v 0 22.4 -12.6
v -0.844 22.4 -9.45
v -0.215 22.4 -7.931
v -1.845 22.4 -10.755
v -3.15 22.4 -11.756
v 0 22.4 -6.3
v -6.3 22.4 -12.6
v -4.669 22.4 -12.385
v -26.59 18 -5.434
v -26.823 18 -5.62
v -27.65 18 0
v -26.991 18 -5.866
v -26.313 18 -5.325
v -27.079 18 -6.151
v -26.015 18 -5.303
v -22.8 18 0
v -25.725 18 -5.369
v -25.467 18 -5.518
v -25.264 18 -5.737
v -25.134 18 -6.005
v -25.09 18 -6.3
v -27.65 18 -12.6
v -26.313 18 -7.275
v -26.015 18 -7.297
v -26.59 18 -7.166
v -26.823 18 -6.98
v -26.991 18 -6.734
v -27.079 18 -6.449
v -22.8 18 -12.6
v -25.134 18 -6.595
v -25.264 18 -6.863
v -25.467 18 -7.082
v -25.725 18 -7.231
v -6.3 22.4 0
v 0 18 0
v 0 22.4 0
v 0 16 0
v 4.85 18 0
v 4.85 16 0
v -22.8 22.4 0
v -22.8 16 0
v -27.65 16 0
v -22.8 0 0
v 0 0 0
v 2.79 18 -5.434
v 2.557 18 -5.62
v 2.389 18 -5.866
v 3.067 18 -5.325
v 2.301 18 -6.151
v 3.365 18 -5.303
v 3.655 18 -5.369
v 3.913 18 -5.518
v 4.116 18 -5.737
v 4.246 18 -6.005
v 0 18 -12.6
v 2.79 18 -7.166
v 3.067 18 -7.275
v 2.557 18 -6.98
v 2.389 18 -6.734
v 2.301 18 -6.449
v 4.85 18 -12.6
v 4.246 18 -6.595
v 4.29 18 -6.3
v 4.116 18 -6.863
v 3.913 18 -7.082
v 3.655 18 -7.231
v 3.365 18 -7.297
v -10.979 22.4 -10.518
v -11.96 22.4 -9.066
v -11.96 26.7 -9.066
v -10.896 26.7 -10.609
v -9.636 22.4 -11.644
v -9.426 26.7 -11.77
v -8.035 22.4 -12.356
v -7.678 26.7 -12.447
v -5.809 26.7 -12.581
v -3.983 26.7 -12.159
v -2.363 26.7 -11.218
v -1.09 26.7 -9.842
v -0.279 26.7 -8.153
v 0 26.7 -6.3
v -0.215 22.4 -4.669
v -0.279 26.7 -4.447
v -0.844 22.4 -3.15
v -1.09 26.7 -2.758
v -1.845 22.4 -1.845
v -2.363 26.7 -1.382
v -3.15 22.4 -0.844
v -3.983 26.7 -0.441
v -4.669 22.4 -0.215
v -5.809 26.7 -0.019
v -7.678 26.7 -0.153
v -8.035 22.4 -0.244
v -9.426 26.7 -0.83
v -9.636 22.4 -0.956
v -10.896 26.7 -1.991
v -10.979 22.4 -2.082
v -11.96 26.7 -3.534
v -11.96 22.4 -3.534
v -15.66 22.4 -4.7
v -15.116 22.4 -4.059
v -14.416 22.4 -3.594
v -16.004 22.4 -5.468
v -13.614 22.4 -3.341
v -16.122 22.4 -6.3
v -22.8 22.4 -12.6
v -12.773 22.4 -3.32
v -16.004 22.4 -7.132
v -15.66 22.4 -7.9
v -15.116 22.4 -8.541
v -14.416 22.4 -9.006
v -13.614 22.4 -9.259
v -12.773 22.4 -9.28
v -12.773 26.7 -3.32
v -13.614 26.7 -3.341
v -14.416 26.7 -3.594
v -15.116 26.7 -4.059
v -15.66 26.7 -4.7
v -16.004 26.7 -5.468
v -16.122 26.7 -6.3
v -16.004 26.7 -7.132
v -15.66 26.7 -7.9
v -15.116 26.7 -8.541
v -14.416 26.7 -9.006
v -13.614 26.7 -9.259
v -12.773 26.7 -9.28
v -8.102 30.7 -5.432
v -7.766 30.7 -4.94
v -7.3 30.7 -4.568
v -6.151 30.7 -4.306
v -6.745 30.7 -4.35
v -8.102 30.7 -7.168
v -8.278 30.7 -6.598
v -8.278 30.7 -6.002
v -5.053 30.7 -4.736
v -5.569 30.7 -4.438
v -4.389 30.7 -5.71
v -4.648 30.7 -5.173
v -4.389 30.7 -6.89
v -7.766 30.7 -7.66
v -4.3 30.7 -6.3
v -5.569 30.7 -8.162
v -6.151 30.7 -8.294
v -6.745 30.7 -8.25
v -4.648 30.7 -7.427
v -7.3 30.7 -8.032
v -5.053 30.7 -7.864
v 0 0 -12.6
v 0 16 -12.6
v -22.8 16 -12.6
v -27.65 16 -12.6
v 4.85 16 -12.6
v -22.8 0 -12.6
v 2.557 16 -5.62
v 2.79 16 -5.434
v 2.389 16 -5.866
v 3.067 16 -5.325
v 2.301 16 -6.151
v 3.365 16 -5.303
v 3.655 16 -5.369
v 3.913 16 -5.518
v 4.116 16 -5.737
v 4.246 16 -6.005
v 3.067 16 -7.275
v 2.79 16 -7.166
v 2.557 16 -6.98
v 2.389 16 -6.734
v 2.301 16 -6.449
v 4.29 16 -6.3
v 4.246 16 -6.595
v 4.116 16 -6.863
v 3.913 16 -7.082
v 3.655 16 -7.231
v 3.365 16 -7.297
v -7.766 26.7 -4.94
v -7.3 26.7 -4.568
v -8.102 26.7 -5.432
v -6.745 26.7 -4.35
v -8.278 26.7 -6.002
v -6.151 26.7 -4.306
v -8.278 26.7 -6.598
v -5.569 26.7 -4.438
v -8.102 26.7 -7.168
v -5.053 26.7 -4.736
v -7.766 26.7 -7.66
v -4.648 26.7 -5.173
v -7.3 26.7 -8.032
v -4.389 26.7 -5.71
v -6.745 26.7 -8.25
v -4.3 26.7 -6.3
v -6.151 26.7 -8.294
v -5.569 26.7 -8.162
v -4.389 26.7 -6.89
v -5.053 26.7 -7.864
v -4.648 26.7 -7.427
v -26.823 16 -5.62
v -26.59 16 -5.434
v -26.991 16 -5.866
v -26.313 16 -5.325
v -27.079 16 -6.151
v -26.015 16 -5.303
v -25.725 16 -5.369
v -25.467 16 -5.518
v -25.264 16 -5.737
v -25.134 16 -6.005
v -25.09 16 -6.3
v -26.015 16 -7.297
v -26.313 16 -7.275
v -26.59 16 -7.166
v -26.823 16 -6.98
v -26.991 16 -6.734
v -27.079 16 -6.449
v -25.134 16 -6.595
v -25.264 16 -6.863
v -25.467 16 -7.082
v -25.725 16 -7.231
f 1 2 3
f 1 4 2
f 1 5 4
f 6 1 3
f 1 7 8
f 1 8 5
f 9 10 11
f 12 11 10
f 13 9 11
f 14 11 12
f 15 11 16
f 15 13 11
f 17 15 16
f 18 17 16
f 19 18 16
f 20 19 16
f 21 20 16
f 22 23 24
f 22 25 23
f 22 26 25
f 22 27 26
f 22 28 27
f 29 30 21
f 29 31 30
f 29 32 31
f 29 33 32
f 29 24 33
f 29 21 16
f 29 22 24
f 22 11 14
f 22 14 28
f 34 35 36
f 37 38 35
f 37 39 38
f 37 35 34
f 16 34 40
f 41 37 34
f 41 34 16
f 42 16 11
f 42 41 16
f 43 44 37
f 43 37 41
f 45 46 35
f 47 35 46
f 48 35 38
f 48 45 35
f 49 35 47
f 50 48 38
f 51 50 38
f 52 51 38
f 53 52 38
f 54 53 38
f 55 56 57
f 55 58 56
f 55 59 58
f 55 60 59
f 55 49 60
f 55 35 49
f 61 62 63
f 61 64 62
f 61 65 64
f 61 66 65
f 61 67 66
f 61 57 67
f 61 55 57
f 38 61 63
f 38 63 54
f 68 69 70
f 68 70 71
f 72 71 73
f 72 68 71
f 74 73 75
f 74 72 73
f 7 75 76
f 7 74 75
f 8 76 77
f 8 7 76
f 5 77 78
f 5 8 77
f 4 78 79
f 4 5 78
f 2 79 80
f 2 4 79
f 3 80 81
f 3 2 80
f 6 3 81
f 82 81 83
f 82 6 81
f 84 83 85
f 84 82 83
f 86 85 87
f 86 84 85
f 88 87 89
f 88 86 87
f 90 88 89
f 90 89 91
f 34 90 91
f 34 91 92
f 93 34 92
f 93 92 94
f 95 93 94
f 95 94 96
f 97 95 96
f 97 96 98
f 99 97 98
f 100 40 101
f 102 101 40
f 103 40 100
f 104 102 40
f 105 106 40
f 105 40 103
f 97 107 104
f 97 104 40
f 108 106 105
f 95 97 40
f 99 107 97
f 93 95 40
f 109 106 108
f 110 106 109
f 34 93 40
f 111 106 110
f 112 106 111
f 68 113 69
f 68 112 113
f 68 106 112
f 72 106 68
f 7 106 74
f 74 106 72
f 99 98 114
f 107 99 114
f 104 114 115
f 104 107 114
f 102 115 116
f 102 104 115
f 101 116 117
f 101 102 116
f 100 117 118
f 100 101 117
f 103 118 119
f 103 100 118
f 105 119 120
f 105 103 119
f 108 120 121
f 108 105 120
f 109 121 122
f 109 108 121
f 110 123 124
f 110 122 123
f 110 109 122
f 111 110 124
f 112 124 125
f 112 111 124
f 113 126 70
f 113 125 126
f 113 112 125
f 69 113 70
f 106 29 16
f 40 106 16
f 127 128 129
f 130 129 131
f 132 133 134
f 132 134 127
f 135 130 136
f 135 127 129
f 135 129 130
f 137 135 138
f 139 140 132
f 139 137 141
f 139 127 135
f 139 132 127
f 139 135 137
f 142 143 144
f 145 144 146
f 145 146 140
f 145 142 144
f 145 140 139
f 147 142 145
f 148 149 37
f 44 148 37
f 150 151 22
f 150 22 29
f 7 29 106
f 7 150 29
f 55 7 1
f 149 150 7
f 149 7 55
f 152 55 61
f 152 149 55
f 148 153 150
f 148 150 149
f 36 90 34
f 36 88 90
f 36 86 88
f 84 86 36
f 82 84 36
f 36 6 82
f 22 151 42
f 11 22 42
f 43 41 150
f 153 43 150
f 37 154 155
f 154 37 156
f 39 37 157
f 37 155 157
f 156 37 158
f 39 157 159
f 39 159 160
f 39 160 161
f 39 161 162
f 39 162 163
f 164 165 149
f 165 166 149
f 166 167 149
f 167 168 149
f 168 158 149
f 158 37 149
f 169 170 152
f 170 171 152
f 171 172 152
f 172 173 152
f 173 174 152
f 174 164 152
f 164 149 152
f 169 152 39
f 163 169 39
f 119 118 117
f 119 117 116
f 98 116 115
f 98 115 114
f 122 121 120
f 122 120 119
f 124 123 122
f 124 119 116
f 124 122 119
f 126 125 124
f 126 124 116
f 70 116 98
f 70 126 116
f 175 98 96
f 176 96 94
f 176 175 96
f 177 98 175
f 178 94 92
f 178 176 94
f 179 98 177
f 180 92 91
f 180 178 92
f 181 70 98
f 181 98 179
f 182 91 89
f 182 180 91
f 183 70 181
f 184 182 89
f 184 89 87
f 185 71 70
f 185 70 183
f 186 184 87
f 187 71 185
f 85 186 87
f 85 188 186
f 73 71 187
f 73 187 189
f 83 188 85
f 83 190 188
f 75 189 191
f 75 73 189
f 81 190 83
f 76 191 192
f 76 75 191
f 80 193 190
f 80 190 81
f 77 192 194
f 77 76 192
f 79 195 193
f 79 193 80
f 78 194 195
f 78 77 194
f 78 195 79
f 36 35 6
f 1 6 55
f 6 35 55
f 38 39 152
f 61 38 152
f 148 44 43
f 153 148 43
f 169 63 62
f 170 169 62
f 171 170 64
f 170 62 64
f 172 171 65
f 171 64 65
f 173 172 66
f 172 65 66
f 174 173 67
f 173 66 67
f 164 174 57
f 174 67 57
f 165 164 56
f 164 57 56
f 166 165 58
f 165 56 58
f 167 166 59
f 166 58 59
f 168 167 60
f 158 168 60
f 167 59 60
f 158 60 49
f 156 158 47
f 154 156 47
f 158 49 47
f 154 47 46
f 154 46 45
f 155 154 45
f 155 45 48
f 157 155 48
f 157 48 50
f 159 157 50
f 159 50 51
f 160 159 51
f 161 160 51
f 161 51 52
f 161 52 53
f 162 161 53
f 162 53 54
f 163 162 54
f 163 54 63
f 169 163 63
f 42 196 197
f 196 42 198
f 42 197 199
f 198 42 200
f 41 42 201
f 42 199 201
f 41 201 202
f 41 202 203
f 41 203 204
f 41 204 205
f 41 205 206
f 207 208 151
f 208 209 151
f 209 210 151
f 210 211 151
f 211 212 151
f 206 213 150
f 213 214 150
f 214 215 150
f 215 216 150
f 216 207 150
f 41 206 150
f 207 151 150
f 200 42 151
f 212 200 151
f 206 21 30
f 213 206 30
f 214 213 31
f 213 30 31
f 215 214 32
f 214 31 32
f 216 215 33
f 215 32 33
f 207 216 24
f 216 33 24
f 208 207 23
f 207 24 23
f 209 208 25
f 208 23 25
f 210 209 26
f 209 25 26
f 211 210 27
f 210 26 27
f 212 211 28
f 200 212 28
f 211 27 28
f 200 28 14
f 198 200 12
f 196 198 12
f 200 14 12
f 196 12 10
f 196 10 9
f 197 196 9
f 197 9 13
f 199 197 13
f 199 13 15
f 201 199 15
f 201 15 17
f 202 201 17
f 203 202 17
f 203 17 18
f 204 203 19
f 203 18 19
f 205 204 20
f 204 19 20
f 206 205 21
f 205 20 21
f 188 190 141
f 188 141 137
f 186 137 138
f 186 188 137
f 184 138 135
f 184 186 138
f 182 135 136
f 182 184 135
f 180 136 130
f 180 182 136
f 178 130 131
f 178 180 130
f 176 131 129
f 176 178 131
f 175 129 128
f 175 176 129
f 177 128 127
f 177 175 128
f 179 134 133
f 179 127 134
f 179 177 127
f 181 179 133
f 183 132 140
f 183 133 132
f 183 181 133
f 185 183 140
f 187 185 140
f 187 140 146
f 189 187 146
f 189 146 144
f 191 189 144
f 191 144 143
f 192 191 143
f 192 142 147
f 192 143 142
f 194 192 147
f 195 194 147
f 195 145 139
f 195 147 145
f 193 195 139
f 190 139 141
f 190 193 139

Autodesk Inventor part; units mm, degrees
ref_plane "YZ Plane" through (0, 0, 0) normal (1, 0, 0) x (0, 1, 0)
ref_plane "XZ Plane" through (0, 0, 0) normal (0, 1, 0) x (-1, 0, 0)
ref_plane "XY Plane" through (0, 0, 0) normal (0, 0, 1) x (1, 0, 0)
sketch "Sketch1" plane through (0, 0, 0) normal (0, 1, 0) x (-1, 0, 0)
  line L0 (0, 0) -> (22.8, 0)
  line L1 (22.8, 0) -> (22.8, -12.6)
  line L2 (22.8, -12.6) -> (0, -12.6)
  line L3 (0, -12.6) -> (0, 0)
  dimension "d0" = 22.8
  dimension "d1" = 12.6
extrude "Extrusion1" add sketch "Sketch1" along normal blind 16
sketch "Sketch2" plane through (0, 16, 0) normal (0, 1, 0) x (1, 0, 0)
  line L0 (0, 0) -> (4.85, 0)
  line L1 (4.85, 0) -> (4.85, 12.6)
  line L2 (0, 12.6) -> (-22.8, 12.6) projected
  line L3 (4.85, 12.6) -> (-22.8, 12.6)
  line L4 (-22.8, 12.6) -> (-27.65, 12.6)
  line L5 (-27.65, 12.6) -> (-27.65, 0)
  line L6 (-27.65, 0) -> (4.85, 0)
  line L7 (-22.8, 0) -> (0, 0) projected
  dimension "d4" = 4.85
  dimension "d5" = 4.85
extrude "Extrusion2" add sketch "Sketch2" along normal blind 2
sketch "Sketch3" plane through (0, 18, 0) normal (0, 1, 0) x (1, 0, 0)
  line L0 (-27.65, 0) -> (-22.8, 0) projected
  line L1 (0, 0) -> (0, 12.6) projected
  line L2 (-22.8, 0) -> (0, 0)
  line L3 (0, 0) -> (0, 12.6)
  line L4 (0, 12.6) -> (-22.8, 12.6)
  line L5 (-22.8, 12.6) -> (-22.8, 0)
extrude "Extrusion3" add sketch "Sketch3" along normal blind 1
sketch "Sketch4" plane through (0, 18, 0) normal (0, 1, 0) x (1, 0, 0)
  line L0 (-27.65, 12.6) -> (-27.65, 0) projected
  circle A0 centre (-26.09, 6.3) radius 1
  circle A1 centre (3.29, 6.3) radius 1
  line L1 (4.85, 0) -> (4.85, 12.6) projected
  point P0 (0, 0)
  dimension "d11" = 1.56
  dimension "d12" = 2
  dimension "d13" = 2
  dimension "d14" = 1.56
extrude "Extrusion4" cut sketch "Sketch4" against normal through all
sketch "Sketch5" plane through (-27.65, 18, -12.6) normal (0, 1, 0) x (1, 0, 0)
  point P0 (27.65, -12.6)
sketch "Sketch6" plane through (-27.65, 18, -12.6) normal (0, 1, 0) x (1, 0, 0)
  line L0 (4.85, 0) -> (0, 0) projected
  line L1 (4.85, 0) -> (27.65, 0)
  line L2 (27.65, 0) -> (27.65, -12.6)
  line L3 (27.65, -12.6) -> (4.85, -12.6)
  line L4 (4.85, -12.6) -> (4.85, 0)
extrude "Extrusion5" add sketch "Sketch6" along normal blind 4.4
sketch "Sketch7" plane through (-27.65, 22.4, -12.6) normal (0, 1, 0) x (1, 0, 0)
  circle A0 centre (21.35, -6.3) radius 6.3
  line L0 (27.65, -12.6) -> (4.85, -12.6) projected
  line L1 (27.65, -12.6) -> (27.65, 0) projected
  circle A1 centre (14.1367, -6.3) radius 3
  dimension "d22" = 6.3
  dimension "d23" = 6
extrude "Extrusion6" add sketch "Sketch7" along normal blind 4.3 contours A0 A1 | A1 A0 picked at (24.082, -5.787) picked at (15.7711, -6.9546)
sketch "Sketch8" plane through (-27.65, 22.4, -12.6) normal (0, 1, 0) x (1, 0, 0)
  circle A0 centre (14.5284, -6.3) radius 3
  point P0 (27.65, -12.6)
  dimension "d26" = 6
extrude "Extrusion7" add sketch "Sketch8" along normal blind 4.3
sketch "Sketch9" plane through (-27.65, 26.7, -12.6) normal (0, 1, 0) x (1, 0, 0)
  arc A0 (15.6897, -9.0661) -> (15.6897, -3.5339) centre (21.35, -6.3) ccw projected
  circle A1 centre (21.35, -6.3) radius 2
  point P0 (27.65, -12.6)
  dimension "d29" = 4
extrude "Extrusion8" add sketch "Sketch9" along normal blind 4
properties part number "SG92R"
